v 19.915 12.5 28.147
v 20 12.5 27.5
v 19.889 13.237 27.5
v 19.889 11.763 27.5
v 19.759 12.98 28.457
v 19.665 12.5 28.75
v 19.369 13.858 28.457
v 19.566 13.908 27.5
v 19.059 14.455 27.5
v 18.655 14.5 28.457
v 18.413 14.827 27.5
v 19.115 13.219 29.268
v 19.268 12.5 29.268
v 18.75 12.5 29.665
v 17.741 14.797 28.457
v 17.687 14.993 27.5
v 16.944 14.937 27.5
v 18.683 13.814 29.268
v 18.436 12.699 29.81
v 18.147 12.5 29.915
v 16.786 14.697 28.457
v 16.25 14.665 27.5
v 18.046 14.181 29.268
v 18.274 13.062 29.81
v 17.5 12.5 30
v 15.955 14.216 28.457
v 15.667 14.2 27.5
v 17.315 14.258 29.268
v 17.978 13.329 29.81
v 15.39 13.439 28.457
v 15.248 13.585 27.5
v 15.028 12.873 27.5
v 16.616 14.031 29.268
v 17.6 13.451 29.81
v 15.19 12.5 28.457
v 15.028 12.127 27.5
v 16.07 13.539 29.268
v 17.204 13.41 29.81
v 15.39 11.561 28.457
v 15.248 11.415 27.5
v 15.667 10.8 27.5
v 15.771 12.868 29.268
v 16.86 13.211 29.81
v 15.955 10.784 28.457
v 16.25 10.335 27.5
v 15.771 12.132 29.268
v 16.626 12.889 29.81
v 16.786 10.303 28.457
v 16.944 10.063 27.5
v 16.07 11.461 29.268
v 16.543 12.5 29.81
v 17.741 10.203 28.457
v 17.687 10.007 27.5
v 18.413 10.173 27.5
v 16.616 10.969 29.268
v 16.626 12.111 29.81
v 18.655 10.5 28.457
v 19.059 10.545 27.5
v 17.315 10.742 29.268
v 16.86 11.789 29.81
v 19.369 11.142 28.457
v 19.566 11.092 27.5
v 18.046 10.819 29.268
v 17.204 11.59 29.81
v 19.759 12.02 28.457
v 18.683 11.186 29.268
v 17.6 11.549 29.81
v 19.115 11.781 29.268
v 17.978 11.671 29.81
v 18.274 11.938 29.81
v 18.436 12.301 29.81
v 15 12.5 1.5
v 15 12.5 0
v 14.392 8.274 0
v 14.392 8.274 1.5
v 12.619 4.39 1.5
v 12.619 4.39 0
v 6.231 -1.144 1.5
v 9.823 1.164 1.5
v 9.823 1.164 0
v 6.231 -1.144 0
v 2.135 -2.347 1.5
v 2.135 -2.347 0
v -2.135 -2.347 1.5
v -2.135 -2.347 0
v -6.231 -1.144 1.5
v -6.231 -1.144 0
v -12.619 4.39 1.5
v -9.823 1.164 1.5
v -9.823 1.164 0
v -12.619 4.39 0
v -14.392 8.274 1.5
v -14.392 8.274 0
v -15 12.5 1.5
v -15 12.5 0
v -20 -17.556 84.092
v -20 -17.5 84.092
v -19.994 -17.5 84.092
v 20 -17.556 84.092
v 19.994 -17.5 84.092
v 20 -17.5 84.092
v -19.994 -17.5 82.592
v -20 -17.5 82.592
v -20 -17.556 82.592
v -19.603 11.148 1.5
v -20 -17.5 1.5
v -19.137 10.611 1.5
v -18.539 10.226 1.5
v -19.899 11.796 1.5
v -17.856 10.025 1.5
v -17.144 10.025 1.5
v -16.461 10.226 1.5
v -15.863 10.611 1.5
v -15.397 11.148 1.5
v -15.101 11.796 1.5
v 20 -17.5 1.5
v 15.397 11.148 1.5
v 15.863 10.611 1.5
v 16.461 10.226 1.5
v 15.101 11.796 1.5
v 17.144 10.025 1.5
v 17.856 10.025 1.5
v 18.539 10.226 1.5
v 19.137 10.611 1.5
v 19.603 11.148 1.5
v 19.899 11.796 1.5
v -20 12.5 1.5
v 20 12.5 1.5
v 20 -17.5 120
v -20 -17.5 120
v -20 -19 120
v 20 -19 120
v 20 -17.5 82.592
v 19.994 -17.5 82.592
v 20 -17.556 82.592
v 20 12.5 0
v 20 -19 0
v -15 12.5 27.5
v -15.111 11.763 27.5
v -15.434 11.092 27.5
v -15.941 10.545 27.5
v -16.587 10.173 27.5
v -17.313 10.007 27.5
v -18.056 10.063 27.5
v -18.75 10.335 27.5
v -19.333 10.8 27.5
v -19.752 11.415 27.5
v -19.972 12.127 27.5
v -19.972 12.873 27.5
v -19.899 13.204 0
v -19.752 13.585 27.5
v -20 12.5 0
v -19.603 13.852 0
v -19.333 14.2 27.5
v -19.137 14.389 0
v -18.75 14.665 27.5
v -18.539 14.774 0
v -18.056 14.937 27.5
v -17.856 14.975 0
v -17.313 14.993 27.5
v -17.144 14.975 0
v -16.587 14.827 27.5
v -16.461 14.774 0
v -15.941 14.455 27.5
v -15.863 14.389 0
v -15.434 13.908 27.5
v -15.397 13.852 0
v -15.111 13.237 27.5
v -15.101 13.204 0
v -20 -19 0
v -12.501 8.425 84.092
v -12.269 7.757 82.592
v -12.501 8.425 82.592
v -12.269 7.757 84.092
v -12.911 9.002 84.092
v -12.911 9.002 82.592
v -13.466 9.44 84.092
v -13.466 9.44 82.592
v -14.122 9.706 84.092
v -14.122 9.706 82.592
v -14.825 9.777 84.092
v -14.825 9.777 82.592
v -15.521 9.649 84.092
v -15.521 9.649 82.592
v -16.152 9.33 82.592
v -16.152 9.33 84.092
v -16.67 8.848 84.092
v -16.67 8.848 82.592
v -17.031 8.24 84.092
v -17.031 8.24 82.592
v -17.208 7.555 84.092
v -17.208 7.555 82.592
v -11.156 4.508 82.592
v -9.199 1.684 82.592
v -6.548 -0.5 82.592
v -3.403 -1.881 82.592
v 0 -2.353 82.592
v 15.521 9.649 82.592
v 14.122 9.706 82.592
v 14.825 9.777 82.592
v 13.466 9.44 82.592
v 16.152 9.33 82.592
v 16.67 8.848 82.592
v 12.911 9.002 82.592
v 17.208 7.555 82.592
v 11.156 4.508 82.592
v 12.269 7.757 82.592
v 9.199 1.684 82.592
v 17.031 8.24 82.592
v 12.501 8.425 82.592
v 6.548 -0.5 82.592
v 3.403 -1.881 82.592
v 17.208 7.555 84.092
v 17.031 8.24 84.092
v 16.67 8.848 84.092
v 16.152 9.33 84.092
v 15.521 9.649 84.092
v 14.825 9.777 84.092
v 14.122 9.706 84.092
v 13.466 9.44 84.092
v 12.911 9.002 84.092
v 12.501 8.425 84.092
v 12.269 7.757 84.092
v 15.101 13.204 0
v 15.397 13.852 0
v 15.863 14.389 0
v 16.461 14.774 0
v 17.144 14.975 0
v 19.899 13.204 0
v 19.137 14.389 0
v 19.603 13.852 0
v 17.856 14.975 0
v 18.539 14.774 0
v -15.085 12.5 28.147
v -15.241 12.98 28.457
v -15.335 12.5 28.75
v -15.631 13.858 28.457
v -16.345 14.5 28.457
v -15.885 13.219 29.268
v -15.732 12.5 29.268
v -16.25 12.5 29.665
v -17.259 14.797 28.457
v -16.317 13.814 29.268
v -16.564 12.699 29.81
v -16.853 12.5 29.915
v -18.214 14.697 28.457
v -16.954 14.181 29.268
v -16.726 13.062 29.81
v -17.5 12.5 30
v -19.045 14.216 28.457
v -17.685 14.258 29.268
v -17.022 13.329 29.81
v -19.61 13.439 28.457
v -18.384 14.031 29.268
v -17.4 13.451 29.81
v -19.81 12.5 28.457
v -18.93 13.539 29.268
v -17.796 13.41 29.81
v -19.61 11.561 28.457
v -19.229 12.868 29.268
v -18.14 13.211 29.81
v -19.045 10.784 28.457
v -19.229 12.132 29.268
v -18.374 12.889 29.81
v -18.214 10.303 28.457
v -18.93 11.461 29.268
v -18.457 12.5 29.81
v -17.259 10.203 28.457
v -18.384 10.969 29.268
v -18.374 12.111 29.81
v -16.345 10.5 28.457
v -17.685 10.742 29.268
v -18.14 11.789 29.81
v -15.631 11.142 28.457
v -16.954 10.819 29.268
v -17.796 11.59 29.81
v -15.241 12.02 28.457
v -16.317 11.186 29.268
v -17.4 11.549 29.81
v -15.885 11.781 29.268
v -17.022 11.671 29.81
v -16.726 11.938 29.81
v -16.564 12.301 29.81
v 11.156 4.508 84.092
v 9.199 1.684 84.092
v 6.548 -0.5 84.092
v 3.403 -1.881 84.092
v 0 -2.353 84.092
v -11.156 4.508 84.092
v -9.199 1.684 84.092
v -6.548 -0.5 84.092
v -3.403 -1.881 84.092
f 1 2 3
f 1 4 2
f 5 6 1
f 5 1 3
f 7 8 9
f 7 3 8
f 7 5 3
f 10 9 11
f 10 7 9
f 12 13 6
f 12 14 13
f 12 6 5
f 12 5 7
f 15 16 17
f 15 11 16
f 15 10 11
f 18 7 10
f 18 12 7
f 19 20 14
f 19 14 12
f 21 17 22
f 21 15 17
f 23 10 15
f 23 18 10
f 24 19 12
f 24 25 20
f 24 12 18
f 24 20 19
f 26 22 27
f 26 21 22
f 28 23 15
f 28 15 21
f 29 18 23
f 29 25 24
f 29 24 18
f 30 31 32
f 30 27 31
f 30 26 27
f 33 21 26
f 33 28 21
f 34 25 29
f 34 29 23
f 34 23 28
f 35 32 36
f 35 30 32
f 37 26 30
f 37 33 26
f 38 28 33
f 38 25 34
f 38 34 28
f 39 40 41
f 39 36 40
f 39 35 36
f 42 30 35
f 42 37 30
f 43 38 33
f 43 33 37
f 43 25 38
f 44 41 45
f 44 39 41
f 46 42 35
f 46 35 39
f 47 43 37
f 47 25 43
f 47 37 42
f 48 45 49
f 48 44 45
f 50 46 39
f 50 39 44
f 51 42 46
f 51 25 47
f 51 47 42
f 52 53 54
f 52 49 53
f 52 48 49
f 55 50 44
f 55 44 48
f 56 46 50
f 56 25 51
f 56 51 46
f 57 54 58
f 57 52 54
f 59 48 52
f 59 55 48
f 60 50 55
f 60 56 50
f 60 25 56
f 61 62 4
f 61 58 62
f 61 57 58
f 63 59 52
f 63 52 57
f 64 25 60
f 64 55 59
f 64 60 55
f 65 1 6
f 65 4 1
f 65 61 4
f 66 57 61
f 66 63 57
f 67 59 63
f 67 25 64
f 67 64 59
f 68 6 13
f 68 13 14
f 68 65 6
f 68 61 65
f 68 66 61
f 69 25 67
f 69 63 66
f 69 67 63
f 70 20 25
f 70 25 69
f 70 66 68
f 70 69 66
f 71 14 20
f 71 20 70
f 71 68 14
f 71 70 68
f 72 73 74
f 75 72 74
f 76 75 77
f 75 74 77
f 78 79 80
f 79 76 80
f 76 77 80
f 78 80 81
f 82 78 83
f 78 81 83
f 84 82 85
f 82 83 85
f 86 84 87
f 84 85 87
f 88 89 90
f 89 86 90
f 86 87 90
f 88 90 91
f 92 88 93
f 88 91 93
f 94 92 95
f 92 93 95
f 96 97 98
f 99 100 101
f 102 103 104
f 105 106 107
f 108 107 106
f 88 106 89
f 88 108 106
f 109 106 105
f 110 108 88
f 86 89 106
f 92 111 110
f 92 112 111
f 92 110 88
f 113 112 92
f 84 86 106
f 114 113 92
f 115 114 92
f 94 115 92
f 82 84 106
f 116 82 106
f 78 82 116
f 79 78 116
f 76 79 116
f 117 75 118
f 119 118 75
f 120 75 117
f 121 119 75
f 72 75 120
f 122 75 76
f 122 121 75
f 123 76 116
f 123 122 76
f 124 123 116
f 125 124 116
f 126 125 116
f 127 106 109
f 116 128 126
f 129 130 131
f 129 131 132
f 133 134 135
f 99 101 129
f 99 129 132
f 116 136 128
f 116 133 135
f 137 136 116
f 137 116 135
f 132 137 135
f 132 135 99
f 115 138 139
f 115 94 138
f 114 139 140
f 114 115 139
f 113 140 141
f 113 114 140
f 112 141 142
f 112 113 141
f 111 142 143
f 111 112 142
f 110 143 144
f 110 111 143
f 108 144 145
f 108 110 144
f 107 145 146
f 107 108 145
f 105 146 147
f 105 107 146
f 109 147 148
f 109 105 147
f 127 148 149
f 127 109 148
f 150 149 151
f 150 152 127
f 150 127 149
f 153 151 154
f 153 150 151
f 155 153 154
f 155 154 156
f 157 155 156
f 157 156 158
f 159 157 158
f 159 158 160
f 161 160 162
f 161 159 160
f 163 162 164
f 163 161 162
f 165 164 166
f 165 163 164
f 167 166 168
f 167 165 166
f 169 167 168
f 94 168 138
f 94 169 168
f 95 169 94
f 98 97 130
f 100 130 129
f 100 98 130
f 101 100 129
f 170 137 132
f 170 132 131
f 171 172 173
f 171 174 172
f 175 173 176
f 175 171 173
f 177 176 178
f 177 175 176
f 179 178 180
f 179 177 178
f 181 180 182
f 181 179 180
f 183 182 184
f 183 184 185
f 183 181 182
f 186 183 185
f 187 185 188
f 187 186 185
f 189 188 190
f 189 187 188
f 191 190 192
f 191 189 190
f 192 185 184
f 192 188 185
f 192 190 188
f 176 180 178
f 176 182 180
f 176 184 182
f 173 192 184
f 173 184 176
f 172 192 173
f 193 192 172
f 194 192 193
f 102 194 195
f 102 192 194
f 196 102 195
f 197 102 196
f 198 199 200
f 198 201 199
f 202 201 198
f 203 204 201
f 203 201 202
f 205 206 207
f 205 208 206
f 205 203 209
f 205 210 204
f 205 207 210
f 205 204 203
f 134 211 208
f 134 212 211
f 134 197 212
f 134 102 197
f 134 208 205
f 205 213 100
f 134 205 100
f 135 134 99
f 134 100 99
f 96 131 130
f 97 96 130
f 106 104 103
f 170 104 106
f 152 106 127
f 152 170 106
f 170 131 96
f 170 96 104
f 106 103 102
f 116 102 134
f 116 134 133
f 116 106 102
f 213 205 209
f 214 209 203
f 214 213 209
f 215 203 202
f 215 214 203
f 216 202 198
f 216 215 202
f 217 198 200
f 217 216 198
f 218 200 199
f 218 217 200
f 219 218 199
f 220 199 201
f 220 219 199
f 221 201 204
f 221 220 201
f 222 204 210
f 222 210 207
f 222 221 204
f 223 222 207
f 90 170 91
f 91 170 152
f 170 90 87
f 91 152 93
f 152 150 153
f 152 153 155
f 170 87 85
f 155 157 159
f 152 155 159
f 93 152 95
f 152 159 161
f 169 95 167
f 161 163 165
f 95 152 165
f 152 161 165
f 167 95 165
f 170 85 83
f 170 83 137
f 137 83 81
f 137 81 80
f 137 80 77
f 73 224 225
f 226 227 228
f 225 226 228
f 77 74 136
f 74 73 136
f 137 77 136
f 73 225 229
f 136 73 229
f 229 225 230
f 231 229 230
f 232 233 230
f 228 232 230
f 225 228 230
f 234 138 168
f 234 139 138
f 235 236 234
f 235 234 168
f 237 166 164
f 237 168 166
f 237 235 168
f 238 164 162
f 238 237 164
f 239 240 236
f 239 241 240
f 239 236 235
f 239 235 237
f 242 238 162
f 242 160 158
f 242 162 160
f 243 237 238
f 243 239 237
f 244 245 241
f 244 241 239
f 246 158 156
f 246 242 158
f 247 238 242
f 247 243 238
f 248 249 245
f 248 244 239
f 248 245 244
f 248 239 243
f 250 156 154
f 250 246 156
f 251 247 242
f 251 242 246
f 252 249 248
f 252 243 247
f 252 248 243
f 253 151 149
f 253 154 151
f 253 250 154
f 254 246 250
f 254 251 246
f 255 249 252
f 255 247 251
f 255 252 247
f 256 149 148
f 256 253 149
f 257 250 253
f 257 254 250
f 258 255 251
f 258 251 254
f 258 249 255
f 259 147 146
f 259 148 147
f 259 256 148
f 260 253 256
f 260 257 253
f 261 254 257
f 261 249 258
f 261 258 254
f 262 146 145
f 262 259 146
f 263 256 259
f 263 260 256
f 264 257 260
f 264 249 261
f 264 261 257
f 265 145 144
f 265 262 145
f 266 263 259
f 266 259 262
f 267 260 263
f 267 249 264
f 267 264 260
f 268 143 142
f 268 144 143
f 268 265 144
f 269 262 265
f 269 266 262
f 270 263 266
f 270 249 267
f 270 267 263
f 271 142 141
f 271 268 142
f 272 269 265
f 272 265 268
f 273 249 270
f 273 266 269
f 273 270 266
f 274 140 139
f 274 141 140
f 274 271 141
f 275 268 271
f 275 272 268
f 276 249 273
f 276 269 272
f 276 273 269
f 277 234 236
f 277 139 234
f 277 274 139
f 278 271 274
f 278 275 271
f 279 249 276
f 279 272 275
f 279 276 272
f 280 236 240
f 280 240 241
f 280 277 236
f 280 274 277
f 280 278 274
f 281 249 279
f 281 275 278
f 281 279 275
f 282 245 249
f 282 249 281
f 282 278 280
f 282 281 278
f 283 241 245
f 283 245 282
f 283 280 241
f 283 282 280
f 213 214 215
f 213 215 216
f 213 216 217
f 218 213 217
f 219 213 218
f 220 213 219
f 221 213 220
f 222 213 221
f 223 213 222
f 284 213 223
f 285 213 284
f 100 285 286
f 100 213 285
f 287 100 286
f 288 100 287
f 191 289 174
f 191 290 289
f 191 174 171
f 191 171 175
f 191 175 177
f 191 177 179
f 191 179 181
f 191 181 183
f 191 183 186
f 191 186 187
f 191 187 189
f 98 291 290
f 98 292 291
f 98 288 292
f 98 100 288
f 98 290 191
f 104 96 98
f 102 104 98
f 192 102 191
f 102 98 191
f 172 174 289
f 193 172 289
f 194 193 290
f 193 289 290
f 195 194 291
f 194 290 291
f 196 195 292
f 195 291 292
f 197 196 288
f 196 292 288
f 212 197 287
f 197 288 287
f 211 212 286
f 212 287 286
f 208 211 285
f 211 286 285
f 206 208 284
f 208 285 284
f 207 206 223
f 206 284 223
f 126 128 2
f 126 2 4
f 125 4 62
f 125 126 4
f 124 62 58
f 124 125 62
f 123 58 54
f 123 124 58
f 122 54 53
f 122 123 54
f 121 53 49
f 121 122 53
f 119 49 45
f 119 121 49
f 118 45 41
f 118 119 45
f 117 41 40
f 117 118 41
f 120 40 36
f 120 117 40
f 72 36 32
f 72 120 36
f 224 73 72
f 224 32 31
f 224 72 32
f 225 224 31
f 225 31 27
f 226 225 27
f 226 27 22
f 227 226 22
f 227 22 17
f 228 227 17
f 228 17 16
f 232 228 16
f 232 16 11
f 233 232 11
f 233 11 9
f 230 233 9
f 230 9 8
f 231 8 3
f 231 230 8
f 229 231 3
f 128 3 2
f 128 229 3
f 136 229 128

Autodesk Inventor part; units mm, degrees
ref_plane "YZ Plane" through (0, 0, 0) normal (1, 0, 0) x (0, 1, 0)
ref_plane "XZ Plane" through (0, 0, 0) normal (0, 1, 0) x (-1, 0, 0)
ref_plane "XY Plane" through (0, 0, 0) normal (0, 0, 1) x (1, 0, 0)
sketch "Sketch1" plane through (0, 0, 0) normal (0, 0, 1) x (1, 0, 0)
  line L0 (20, 12.5) -> (20, -17.5)
  line L1 (20, -17.5) -> (-20, -17.5)
  line L2 (-20, -17.5) -> (-20, 12.5)
  circle A0 centre (-17.5, 12.5) radius 2.5
  circle A1 centre (17.5, 12.5) radius 2.5
  arc A2 (-15, 12.5) -> (15, 12.5) centre (0, 12.5) ccw
  point P0 (0, 0)
  dimension "d0" = 40
  dimension "d2" = 5
  dimension "d3" = 5
  dimension "d4" = 30
  dimension "d5" = 20
  dimension "d6" = 17.5
  dimension "d7" = 15
extrude "Extrusion1" add sketch "Sketch1" along normal blind 1.5 contours L0 L1 L2 A0 A2 A1
extrude "Extrusion2" add sketch "Sketch1" along normal blind 30 contours A1 | A0
fillet "Fillet1" radius 2.5 2 edges at (-20, 12.5, 30) (15, 12.5, 30)
sketch "Sketch2" plane through (0, 0, 0) normal (0, 0, 1) x (1, 0, 0)
  line L0 (-20, -17.5) -> (20, -17.5)
  line L1 (-20, -17.5) -> (20, -17.5)
  line L2 (-20, -17.5) -> (20, -17.5)
  line L3 (20, -17.5) -> (20, -19)
  line L4 (20, -19) -> (-20, -19)
  line L5 (-20, -19) -> (-20, -17.5)
  point P0 (0, 0)
  dimension "d13" = 1.5
extrude "Extrusion3" add sketch "Sketch2" along normal blind 120
sketch "Sketch5" plane through (-20, -17.5, 1.5) normal (0, 1, 0) x (1, 0, 0)
  line L0 (0, 0) -> (0, -118.5)
  line L1 (40, 0) -> (40, -118.5)
  line L2 (0, -81.0917) -> (40, -81.0917)
  line L3 (40, -81.0917) -> (40, -82.5917)
  line L4 (40, -82.5917) -> (0, -82.5917)
  line L5 (0, -82.5917) -> (0, -81.0917)
  line L6 (0, 0) -> (40, 0)
  point P0 (20, 1.5)
  point P1 (0, -82.5917)
  dimension "d25" = 1.5
  dimension "d26" = 81.0917
extrude "Extrusion5" add sketch "Sketch5" along normal blind 30 contours L2 L1 L4 L0
sketch "Sketch6" plane through (-20, -17.5, 84.0917) normal (0, 0, 1) x (1, 0, 0)
  line L0 (0, 30) -> (0, -1.5)
  line L1 (0, -0.0564) -> (0, 30)
  line L2 (40, 30) -> (0, 30)
  line L3 (0, 30) -> (40, 30)
  line L4 (40, 30) -> (40, -0.0564)
  line L5 (40, -0.0564) -> (0, -0.0564)
  line L6 (0, -0.0564) -> (2.7921, 25.0554)
  arc A0 (7.7306, 25.2572) -> (2.7921, 25.0554) centre (5.2768, 24.7792) ccw
  arc A1 (7.7306, 25.2572) -> (32.2694, 25.2572) centre (20, 27.6473) ccw
  arc A2 (37.2079, 25.0554) -> (32.2694, 25.2572) centre (34.7232, 24.7792) ccw
  line L7 (37.2079, 25.0554) -> (40, -0.0564)
  line L8 (20, -0.0564) -> (20, 30)
  point P0 (20, 17.5)
  dimension "d29" = 2.5
  dimension "d30" = 12.5
  dimension "d31" = 29.4465
  dimension "d32" = 6.344
  dimension "d33" = 30.0564
extrude "Extrusion6" cut sketch "Sketch6" against normal up to surface (1.5 mm away) contours L2 L8 A1 A0 L6 L0 | L2 L4 L7 A2 A1 L8
equation "\"d2\" = arm_thickness"
equation "\"d3\" = arm_thickness"
equation "\"d7\" = 3 * arm_thickness"
equation "\"d8\" = material_thickness"
equation "\"d10\" = arm_length"
equation "\"d12\" = 0.5 * arm_thickness"
equation "\"d13\" = material_thickness"
equation "\"d25\" = material_thickness"
equation "\"d29\" = 0.5 * arm_thickness"
equation "\"arm_thickness\" = 5"
equation "\"material_thickness\" = 1.5"
equation "\"arm_length\" = 30"
properties part number "my_portafilter_holder_§"
